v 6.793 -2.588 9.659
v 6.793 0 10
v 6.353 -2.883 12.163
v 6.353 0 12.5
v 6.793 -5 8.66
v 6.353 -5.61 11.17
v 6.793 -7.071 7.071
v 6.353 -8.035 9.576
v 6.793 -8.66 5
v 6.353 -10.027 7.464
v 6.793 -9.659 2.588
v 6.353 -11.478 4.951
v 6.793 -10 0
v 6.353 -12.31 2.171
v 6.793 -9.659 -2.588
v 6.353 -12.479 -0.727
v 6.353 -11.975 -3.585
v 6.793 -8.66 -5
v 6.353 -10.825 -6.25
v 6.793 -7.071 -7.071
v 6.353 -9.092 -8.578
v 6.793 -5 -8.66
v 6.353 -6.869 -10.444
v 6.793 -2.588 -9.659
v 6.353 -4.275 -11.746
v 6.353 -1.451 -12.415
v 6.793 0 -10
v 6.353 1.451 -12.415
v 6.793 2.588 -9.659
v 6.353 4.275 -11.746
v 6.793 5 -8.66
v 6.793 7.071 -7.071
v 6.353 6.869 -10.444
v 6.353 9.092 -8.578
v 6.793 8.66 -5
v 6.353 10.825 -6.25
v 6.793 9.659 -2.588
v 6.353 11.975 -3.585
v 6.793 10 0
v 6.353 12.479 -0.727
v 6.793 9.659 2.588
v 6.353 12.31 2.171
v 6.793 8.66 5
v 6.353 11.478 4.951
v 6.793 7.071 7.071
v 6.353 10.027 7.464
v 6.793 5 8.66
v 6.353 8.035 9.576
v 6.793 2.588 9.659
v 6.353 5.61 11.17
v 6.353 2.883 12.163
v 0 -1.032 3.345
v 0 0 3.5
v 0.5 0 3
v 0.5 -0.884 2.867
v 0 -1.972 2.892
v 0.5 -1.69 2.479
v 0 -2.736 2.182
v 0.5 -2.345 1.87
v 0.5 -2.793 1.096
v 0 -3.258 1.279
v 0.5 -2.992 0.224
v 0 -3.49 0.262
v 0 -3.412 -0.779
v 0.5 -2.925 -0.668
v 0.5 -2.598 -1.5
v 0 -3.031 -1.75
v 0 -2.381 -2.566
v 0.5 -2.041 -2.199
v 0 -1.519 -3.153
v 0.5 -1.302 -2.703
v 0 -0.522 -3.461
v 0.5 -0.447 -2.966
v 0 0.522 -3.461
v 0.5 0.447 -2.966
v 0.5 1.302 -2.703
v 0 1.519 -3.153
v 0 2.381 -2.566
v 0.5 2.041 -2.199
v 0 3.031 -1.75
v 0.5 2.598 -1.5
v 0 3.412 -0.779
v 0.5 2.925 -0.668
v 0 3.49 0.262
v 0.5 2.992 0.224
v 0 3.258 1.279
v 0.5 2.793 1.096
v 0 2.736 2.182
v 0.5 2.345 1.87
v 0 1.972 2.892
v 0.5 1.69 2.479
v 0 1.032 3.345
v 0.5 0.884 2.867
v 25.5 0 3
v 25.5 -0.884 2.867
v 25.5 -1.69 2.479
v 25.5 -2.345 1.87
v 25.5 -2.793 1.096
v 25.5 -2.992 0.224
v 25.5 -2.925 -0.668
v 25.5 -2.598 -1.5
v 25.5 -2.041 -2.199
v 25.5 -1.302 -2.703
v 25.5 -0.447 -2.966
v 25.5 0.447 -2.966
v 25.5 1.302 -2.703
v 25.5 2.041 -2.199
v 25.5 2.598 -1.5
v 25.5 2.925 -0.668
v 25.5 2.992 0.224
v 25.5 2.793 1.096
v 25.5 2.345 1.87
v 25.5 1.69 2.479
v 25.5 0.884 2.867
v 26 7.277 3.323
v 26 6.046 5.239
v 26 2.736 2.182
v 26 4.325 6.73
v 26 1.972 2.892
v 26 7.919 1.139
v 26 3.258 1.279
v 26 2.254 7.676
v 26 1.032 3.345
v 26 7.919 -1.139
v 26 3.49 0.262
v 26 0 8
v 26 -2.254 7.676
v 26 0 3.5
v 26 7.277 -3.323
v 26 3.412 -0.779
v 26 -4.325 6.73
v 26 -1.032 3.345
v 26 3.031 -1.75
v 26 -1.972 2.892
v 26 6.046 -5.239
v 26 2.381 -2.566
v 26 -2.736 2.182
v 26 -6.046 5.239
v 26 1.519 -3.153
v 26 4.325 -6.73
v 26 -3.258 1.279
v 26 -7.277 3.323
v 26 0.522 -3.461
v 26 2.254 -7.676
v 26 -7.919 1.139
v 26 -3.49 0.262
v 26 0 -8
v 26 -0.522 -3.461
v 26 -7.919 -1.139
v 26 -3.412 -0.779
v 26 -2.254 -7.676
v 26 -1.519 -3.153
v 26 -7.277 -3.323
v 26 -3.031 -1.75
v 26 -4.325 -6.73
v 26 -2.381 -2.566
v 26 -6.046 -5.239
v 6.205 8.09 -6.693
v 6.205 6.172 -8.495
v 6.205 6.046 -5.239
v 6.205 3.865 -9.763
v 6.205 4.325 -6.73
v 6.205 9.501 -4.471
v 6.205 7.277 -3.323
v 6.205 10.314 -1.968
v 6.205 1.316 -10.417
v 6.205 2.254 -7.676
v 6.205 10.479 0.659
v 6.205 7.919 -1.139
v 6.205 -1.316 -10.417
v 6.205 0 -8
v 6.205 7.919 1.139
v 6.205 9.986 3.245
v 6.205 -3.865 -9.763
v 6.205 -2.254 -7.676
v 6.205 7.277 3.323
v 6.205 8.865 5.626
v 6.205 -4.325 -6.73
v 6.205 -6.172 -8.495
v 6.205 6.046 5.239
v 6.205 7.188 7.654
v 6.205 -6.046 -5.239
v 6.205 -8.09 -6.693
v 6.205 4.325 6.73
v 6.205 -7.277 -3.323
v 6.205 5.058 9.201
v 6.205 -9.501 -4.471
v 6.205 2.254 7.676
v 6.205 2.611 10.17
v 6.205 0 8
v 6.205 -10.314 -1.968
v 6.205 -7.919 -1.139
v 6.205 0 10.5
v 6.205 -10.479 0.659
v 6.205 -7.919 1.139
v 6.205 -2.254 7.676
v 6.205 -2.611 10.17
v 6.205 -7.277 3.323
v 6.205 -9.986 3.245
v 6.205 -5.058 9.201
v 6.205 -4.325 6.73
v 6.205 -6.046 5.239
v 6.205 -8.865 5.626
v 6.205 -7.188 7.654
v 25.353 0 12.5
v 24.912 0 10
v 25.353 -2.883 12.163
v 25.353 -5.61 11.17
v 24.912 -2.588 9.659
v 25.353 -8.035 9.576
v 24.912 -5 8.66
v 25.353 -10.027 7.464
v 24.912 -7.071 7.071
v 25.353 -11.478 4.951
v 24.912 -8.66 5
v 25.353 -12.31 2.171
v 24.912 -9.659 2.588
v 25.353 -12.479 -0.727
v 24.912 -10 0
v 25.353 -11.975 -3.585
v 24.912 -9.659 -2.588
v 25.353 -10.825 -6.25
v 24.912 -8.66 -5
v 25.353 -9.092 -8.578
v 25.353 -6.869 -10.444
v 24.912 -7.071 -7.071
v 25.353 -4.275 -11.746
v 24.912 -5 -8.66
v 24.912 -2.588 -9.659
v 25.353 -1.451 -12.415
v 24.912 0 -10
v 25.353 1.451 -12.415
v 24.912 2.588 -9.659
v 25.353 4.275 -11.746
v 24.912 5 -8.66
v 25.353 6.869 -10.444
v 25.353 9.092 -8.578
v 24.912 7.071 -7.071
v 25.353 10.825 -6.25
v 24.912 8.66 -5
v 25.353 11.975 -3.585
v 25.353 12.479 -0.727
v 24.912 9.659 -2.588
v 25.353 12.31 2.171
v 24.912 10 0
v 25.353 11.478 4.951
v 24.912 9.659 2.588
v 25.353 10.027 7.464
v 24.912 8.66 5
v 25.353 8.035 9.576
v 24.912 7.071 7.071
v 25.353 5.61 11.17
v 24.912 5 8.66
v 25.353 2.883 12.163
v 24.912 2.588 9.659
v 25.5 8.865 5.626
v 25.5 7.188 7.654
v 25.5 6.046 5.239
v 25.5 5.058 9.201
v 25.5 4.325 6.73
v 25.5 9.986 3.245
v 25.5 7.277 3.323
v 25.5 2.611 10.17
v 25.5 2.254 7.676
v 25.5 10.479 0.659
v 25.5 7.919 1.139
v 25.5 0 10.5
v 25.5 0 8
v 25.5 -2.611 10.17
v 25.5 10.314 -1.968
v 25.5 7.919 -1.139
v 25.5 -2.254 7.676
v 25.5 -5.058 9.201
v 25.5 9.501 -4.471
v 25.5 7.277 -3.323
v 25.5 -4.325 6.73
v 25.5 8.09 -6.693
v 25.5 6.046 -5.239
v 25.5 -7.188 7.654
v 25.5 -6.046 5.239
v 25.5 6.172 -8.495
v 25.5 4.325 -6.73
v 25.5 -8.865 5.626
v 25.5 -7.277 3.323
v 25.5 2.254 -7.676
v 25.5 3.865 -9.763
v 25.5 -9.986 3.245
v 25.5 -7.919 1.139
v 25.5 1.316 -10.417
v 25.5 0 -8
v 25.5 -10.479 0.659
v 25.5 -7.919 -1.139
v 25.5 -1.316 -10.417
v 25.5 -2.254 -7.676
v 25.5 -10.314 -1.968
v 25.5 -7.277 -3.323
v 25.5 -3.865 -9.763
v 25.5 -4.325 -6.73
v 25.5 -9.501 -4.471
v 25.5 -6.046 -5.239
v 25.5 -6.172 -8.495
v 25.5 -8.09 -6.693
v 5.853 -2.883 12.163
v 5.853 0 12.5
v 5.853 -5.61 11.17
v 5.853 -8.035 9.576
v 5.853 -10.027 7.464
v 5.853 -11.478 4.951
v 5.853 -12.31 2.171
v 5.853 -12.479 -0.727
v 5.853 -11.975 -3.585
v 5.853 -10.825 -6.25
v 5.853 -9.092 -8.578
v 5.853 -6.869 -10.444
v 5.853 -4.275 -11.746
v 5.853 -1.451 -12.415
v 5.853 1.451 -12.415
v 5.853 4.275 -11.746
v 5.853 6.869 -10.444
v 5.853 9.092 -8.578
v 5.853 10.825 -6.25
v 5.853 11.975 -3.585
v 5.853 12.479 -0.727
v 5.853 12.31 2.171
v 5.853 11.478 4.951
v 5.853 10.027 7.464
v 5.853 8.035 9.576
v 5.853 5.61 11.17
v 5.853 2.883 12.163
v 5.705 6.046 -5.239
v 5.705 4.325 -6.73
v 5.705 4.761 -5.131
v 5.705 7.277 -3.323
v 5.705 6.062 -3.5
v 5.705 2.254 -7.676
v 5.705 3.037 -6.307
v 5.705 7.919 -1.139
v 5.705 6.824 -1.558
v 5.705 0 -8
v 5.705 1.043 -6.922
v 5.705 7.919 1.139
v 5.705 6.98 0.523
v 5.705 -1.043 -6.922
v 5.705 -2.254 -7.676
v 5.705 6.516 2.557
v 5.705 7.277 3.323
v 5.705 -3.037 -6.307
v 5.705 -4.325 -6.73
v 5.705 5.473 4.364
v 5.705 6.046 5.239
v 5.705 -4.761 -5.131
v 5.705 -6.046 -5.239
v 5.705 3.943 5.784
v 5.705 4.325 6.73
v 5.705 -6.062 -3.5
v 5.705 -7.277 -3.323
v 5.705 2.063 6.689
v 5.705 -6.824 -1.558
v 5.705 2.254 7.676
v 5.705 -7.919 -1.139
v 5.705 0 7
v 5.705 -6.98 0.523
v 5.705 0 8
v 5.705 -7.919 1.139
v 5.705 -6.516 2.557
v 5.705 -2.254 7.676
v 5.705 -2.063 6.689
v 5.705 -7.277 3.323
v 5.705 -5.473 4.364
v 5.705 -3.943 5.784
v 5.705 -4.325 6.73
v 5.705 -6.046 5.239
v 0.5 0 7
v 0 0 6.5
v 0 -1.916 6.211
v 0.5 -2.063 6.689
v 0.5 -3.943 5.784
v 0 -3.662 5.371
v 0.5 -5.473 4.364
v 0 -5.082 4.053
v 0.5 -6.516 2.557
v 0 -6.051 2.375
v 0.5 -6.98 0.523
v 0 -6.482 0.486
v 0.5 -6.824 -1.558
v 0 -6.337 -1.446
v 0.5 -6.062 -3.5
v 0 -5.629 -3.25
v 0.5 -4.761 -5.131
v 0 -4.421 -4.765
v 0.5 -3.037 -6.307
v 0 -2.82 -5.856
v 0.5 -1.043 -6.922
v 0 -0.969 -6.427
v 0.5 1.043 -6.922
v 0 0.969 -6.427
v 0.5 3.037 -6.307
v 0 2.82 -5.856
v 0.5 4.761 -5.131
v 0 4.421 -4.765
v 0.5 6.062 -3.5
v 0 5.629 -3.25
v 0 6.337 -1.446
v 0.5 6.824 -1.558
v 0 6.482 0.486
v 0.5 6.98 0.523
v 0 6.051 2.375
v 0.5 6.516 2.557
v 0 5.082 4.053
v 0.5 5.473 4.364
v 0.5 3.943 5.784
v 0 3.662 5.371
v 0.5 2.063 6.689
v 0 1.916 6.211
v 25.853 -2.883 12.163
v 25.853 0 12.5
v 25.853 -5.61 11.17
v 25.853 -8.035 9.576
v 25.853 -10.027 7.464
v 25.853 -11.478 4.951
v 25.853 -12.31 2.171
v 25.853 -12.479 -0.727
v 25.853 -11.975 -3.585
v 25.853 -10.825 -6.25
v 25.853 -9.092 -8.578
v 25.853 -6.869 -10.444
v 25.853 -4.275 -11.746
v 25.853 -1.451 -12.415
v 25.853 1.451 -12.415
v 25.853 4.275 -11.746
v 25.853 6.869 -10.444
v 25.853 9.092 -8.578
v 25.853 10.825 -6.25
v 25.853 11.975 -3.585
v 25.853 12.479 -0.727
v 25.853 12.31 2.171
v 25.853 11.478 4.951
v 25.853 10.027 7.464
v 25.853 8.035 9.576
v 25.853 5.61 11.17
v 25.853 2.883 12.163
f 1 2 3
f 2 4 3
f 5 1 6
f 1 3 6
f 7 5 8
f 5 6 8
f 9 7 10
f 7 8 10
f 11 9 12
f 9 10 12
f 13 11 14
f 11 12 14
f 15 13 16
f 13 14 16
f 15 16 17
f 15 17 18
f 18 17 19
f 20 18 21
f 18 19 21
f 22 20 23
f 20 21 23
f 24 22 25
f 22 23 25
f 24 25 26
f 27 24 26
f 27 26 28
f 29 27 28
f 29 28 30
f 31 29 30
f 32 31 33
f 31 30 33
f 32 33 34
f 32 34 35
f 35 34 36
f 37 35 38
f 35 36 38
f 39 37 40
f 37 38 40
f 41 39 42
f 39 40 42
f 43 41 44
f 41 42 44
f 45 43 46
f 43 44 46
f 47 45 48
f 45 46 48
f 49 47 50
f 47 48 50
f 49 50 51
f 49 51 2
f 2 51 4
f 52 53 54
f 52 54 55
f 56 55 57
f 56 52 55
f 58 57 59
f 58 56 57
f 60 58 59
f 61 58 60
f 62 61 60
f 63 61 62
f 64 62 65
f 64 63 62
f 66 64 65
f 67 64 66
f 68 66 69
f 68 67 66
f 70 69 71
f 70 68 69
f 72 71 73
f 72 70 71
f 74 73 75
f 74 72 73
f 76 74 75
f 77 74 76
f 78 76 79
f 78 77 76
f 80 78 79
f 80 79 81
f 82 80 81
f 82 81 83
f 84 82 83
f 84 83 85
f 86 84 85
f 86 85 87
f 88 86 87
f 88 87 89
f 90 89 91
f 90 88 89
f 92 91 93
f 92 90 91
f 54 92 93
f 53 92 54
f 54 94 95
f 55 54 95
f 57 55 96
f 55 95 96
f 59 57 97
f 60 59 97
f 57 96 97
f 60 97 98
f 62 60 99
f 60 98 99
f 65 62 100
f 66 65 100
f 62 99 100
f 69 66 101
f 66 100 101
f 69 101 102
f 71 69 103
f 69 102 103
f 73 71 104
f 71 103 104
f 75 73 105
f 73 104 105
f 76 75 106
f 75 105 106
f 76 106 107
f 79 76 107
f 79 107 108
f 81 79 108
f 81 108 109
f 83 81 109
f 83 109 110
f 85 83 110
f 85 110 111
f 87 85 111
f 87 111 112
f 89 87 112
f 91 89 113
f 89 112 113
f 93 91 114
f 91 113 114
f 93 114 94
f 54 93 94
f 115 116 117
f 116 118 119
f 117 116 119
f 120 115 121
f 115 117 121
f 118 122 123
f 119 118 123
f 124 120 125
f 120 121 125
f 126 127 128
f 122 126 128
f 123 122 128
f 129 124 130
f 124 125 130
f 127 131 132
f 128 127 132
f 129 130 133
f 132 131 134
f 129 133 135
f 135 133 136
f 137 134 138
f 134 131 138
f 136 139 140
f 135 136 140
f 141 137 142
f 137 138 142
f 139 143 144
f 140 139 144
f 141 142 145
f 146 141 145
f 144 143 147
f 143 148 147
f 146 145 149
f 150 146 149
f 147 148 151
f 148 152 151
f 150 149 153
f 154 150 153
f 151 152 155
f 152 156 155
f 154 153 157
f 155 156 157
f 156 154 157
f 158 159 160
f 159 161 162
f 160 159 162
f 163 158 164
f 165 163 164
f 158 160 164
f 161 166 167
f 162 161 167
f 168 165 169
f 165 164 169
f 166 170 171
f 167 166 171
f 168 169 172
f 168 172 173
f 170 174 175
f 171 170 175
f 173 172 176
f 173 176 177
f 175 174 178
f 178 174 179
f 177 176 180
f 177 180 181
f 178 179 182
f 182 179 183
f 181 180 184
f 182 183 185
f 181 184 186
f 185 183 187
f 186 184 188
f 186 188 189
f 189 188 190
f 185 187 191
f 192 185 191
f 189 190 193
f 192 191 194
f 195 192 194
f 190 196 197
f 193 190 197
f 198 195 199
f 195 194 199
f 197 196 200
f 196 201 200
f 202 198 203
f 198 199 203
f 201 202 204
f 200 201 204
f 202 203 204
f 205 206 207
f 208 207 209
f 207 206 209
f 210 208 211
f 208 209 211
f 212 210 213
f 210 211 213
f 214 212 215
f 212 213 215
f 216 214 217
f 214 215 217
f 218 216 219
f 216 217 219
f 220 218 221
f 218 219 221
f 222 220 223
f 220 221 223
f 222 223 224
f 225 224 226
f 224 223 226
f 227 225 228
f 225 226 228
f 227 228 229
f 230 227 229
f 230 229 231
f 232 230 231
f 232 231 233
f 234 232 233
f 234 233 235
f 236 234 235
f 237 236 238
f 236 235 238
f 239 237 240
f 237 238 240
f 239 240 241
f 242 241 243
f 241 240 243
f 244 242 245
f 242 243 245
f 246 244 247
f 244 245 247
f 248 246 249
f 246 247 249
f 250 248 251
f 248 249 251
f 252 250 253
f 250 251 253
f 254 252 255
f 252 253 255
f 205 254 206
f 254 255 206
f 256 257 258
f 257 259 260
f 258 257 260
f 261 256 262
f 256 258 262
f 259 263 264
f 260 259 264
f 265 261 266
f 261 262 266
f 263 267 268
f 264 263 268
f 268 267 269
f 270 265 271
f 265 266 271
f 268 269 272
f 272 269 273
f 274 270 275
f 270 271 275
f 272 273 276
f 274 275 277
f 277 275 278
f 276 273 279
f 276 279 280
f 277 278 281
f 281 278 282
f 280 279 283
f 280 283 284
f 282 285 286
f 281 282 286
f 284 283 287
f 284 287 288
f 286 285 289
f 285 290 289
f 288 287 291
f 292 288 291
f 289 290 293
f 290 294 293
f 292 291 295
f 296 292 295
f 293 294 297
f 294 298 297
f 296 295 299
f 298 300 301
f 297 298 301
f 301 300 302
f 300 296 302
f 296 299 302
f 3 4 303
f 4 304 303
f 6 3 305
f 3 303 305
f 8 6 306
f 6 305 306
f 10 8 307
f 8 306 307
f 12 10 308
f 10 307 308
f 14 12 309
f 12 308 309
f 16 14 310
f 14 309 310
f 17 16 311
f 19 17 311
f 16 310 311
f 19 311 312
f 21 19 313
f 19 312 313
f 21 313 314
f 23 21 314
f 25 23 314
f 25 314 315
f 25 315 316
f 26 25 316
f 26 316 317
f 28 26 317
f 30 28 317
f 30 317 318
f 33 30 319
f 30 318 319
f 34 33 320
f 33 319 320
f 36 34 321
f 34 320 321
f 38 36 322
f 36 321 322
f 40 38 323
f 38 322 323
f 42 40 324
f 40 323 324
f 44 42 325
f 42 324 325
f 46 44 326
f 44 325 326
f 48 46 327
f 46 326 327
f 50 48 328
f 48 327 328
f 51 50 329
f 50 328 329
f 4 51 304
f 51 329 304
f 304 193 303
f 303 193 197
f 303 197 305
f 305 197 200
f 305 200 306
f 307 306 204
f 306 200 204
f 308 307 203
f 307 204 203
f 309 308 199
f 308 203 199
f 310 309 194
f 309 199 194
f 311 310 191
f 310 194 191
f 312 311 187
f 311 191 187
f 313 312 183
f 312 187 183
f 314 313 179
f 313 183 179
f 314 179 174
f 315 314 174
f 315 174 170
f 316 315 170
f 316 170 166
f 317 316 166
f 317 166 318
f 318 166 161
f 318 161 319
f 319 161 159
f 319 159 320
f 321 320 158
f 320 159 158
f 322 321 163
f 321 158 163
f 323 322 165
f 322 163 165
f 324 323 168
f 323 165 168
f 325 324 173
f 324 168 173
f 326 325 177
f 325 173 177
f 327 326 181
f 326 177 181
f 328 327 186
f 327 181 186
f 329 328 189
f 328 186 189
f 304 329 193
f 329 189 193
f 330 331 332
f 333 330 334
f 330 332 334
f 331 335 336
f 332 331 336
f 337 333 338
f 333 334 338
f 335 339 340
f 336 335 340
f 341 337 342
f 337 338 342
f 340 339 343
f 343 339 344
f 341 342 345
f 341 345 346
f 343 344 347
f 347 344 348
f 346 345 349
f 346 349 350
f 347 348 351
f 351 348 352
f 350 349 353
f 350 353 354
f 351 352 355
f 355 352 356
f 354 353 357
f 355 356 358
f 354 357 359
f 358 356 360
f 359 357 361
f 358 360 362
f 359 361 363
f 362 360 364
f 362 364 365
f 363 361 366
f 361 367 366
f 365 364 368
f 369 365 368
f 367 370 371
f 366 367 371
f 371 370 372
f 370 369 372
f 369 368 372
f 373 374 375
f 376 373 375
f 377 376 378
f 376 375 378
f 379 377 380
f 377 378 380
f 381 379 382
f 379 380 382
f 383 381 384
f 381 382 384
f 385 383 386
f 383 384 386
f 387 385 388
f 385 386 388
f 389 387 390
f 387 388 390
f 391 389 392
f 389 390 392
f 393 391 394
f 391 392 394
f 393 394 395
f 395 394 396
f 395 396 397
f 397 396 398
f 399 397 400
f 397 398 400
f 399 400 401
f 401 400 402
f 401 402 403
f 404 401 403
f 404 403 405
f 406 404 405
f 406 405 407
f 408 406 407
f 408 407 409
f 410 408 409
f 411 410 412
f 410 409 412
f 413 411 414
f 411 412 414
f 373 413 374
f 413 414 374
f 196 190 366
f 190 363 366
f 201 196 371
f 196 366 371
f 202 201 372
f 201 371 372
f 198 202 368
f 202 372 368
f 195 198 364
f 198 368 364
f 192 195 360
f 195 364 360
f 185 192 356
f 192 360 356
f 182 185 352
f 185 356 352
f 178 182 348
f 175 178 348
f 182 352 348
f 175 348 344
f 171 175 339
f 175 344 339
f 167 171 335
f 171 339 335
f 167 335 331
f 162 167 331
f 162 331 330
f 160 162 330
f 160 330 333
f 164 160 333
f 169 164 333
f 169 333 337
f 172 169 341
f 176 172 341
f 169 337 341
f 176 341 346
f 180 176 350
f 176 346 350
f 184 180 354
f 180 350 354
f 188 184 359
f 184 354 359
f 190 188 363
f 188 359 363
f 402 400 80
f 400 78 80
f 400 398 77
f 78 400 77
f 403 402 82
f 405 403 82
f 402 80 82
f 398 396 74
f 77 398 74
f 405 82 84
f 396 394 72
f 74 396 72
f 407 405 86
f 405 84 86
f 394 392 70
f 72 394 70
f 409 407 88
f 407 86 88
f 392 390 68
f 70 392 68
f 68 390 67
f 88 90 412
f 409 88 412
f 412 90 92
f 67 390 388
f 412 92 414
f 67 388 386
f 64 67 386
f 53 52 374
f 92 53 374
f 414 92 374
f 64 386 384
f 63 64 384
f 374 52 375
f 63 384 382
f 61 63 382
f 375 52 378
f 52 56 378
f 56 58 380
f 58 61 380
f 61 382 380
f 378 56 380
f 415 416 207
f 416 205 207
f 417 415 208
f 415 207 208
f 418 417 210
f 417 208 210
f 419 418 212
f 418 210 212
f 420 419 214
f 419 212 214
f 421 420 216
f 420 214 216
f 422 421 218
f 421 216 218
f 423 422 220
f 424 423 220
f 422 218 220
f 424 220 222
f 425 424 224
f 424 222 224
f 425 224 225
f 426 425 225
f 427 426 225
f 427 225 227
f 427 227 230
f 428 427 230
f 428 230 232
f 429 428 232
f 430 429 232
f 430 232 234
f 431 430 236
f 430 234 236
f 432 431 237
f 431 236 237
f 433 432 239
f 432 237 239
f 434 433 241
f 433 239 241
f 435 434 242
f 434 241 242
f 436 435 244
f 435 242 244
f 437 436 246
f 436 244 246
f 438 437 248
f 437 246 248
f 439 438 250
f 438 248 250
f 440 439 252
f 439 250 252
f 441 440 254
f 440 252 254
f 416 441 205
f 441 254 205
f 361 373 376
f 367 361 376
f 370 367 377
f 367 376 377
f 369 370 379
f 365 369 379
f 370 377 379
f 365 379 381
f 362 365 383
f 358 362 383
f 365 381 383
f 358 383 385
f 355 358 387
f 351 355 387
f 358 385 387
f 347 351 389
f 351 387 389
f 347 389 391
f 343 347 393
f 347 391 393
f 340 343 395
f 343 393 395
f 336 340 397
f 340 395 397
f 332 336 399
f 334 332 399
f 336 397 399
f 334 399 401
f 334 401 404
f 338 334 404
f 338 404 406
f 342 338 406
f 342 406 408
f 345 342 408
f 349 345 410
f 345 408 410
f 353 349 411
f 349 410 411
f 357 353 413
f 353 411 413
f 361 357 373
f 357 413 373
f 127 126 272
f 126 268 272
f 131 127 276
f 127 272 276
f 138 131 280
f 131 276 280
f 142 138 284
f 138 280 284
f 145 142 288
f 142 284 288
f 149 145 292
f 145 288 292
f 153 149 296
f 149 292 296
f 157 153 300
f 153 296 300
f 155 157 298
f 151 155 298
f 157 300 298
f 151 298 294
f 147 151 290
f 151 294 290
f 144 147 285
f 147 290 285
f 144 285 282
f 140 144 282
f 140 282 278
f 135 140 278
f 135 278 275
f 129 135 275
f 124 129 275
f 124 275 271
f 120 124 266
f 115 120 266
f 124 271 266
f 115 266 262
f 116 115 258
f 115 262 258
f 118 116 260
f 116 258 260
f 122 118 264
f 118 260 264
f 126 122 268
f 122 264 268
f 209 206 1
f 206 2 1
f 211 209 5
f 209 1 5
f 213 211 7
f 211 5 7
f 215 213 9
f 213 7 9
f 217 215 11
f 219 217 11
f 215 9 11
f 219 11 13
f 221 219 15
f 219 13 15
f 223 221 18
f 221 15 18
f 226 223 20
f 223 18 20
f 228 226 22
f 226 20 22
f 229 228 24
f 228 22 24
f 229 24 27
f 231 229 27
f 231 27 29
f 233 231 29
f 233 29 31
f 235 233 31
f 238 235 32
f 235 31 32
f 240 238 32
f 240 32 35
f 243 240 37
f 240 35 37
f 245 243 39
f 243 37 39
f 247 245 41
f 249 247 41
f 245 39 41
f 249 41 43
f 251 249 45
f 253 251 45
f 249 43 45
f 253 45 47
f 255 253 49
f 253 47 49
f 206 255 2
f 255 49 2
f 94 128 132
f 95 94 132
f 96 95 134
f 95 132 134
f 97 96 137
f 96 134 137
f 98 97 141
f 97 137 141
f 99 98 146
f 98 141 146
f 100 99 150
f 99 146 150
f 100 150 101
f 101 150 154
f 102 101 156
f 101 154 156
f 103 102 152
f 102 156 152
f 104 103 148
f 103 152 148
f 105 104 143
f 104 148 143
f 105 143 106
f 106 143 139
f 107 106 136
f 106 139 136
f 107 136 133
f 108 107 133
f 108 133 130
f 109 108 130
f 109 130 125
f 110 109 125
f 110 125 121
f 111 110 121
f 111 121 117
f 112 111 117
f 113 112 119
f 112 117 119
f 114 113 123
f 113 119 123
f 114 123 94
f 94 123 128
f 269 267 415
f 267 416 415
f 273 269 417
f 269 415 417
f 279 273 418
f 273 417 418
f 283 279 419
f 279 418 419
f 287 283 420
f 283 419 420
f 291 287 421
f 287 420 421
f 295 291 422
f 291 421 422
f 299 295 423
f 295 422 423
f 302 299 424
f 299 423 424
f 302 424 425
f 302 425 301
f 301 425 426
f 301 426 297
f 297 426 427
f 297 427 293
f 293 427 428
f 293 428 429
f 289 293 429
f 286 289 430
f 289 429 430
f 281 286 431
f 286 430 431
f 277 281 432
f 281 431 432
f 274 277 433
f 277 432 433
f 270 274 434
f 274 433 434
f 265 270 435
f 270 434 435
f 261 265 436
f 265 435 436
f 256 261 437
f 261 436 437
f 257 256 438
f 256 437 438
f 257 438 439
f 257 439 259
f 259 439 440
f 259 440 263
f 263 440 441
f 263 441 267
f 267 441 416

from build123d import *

# Parameters (mm, degrees)
FASE1_SIZE = 0.5


with BuildPart() as part:
    # Skizze1 → Rotation1 (revolve)
    with BuildSketch(Plane.XY, mode=Mode.PRIVATE) as rotation1_sk:
        Polygon((0, 3), (26, 3), (26, 8), (25.5, 8), (25.5, 10.5), (25.852653961, 12.5), (25.352653961, 12.5), (24.91183651, 10), (6.793471413, 10), (6.352653961, 12.5), (5.852653961, 12.5), (6.205307923, 10.5), (6.205307923, 8), (5.705307923, 8), (5.705307923, 7), (0, 7), align=None)
    revolve(rotation1_sk.sketch.rotate(Axis((0, 0, 0), (1, 0, 0)), 90), axis=Axis((0, 0, 0), (1, 0, 0)))

    # Fase1
    fase1_edges = [part.edges().sort_by_distance(p)[0] for p in [
        (0, 0, -3),
        (26, 0, -3),
        (0, 0, -7),
    ]]
    chamfer(fase1_edges, length=FASE1_SIZE)


solid = part.part
